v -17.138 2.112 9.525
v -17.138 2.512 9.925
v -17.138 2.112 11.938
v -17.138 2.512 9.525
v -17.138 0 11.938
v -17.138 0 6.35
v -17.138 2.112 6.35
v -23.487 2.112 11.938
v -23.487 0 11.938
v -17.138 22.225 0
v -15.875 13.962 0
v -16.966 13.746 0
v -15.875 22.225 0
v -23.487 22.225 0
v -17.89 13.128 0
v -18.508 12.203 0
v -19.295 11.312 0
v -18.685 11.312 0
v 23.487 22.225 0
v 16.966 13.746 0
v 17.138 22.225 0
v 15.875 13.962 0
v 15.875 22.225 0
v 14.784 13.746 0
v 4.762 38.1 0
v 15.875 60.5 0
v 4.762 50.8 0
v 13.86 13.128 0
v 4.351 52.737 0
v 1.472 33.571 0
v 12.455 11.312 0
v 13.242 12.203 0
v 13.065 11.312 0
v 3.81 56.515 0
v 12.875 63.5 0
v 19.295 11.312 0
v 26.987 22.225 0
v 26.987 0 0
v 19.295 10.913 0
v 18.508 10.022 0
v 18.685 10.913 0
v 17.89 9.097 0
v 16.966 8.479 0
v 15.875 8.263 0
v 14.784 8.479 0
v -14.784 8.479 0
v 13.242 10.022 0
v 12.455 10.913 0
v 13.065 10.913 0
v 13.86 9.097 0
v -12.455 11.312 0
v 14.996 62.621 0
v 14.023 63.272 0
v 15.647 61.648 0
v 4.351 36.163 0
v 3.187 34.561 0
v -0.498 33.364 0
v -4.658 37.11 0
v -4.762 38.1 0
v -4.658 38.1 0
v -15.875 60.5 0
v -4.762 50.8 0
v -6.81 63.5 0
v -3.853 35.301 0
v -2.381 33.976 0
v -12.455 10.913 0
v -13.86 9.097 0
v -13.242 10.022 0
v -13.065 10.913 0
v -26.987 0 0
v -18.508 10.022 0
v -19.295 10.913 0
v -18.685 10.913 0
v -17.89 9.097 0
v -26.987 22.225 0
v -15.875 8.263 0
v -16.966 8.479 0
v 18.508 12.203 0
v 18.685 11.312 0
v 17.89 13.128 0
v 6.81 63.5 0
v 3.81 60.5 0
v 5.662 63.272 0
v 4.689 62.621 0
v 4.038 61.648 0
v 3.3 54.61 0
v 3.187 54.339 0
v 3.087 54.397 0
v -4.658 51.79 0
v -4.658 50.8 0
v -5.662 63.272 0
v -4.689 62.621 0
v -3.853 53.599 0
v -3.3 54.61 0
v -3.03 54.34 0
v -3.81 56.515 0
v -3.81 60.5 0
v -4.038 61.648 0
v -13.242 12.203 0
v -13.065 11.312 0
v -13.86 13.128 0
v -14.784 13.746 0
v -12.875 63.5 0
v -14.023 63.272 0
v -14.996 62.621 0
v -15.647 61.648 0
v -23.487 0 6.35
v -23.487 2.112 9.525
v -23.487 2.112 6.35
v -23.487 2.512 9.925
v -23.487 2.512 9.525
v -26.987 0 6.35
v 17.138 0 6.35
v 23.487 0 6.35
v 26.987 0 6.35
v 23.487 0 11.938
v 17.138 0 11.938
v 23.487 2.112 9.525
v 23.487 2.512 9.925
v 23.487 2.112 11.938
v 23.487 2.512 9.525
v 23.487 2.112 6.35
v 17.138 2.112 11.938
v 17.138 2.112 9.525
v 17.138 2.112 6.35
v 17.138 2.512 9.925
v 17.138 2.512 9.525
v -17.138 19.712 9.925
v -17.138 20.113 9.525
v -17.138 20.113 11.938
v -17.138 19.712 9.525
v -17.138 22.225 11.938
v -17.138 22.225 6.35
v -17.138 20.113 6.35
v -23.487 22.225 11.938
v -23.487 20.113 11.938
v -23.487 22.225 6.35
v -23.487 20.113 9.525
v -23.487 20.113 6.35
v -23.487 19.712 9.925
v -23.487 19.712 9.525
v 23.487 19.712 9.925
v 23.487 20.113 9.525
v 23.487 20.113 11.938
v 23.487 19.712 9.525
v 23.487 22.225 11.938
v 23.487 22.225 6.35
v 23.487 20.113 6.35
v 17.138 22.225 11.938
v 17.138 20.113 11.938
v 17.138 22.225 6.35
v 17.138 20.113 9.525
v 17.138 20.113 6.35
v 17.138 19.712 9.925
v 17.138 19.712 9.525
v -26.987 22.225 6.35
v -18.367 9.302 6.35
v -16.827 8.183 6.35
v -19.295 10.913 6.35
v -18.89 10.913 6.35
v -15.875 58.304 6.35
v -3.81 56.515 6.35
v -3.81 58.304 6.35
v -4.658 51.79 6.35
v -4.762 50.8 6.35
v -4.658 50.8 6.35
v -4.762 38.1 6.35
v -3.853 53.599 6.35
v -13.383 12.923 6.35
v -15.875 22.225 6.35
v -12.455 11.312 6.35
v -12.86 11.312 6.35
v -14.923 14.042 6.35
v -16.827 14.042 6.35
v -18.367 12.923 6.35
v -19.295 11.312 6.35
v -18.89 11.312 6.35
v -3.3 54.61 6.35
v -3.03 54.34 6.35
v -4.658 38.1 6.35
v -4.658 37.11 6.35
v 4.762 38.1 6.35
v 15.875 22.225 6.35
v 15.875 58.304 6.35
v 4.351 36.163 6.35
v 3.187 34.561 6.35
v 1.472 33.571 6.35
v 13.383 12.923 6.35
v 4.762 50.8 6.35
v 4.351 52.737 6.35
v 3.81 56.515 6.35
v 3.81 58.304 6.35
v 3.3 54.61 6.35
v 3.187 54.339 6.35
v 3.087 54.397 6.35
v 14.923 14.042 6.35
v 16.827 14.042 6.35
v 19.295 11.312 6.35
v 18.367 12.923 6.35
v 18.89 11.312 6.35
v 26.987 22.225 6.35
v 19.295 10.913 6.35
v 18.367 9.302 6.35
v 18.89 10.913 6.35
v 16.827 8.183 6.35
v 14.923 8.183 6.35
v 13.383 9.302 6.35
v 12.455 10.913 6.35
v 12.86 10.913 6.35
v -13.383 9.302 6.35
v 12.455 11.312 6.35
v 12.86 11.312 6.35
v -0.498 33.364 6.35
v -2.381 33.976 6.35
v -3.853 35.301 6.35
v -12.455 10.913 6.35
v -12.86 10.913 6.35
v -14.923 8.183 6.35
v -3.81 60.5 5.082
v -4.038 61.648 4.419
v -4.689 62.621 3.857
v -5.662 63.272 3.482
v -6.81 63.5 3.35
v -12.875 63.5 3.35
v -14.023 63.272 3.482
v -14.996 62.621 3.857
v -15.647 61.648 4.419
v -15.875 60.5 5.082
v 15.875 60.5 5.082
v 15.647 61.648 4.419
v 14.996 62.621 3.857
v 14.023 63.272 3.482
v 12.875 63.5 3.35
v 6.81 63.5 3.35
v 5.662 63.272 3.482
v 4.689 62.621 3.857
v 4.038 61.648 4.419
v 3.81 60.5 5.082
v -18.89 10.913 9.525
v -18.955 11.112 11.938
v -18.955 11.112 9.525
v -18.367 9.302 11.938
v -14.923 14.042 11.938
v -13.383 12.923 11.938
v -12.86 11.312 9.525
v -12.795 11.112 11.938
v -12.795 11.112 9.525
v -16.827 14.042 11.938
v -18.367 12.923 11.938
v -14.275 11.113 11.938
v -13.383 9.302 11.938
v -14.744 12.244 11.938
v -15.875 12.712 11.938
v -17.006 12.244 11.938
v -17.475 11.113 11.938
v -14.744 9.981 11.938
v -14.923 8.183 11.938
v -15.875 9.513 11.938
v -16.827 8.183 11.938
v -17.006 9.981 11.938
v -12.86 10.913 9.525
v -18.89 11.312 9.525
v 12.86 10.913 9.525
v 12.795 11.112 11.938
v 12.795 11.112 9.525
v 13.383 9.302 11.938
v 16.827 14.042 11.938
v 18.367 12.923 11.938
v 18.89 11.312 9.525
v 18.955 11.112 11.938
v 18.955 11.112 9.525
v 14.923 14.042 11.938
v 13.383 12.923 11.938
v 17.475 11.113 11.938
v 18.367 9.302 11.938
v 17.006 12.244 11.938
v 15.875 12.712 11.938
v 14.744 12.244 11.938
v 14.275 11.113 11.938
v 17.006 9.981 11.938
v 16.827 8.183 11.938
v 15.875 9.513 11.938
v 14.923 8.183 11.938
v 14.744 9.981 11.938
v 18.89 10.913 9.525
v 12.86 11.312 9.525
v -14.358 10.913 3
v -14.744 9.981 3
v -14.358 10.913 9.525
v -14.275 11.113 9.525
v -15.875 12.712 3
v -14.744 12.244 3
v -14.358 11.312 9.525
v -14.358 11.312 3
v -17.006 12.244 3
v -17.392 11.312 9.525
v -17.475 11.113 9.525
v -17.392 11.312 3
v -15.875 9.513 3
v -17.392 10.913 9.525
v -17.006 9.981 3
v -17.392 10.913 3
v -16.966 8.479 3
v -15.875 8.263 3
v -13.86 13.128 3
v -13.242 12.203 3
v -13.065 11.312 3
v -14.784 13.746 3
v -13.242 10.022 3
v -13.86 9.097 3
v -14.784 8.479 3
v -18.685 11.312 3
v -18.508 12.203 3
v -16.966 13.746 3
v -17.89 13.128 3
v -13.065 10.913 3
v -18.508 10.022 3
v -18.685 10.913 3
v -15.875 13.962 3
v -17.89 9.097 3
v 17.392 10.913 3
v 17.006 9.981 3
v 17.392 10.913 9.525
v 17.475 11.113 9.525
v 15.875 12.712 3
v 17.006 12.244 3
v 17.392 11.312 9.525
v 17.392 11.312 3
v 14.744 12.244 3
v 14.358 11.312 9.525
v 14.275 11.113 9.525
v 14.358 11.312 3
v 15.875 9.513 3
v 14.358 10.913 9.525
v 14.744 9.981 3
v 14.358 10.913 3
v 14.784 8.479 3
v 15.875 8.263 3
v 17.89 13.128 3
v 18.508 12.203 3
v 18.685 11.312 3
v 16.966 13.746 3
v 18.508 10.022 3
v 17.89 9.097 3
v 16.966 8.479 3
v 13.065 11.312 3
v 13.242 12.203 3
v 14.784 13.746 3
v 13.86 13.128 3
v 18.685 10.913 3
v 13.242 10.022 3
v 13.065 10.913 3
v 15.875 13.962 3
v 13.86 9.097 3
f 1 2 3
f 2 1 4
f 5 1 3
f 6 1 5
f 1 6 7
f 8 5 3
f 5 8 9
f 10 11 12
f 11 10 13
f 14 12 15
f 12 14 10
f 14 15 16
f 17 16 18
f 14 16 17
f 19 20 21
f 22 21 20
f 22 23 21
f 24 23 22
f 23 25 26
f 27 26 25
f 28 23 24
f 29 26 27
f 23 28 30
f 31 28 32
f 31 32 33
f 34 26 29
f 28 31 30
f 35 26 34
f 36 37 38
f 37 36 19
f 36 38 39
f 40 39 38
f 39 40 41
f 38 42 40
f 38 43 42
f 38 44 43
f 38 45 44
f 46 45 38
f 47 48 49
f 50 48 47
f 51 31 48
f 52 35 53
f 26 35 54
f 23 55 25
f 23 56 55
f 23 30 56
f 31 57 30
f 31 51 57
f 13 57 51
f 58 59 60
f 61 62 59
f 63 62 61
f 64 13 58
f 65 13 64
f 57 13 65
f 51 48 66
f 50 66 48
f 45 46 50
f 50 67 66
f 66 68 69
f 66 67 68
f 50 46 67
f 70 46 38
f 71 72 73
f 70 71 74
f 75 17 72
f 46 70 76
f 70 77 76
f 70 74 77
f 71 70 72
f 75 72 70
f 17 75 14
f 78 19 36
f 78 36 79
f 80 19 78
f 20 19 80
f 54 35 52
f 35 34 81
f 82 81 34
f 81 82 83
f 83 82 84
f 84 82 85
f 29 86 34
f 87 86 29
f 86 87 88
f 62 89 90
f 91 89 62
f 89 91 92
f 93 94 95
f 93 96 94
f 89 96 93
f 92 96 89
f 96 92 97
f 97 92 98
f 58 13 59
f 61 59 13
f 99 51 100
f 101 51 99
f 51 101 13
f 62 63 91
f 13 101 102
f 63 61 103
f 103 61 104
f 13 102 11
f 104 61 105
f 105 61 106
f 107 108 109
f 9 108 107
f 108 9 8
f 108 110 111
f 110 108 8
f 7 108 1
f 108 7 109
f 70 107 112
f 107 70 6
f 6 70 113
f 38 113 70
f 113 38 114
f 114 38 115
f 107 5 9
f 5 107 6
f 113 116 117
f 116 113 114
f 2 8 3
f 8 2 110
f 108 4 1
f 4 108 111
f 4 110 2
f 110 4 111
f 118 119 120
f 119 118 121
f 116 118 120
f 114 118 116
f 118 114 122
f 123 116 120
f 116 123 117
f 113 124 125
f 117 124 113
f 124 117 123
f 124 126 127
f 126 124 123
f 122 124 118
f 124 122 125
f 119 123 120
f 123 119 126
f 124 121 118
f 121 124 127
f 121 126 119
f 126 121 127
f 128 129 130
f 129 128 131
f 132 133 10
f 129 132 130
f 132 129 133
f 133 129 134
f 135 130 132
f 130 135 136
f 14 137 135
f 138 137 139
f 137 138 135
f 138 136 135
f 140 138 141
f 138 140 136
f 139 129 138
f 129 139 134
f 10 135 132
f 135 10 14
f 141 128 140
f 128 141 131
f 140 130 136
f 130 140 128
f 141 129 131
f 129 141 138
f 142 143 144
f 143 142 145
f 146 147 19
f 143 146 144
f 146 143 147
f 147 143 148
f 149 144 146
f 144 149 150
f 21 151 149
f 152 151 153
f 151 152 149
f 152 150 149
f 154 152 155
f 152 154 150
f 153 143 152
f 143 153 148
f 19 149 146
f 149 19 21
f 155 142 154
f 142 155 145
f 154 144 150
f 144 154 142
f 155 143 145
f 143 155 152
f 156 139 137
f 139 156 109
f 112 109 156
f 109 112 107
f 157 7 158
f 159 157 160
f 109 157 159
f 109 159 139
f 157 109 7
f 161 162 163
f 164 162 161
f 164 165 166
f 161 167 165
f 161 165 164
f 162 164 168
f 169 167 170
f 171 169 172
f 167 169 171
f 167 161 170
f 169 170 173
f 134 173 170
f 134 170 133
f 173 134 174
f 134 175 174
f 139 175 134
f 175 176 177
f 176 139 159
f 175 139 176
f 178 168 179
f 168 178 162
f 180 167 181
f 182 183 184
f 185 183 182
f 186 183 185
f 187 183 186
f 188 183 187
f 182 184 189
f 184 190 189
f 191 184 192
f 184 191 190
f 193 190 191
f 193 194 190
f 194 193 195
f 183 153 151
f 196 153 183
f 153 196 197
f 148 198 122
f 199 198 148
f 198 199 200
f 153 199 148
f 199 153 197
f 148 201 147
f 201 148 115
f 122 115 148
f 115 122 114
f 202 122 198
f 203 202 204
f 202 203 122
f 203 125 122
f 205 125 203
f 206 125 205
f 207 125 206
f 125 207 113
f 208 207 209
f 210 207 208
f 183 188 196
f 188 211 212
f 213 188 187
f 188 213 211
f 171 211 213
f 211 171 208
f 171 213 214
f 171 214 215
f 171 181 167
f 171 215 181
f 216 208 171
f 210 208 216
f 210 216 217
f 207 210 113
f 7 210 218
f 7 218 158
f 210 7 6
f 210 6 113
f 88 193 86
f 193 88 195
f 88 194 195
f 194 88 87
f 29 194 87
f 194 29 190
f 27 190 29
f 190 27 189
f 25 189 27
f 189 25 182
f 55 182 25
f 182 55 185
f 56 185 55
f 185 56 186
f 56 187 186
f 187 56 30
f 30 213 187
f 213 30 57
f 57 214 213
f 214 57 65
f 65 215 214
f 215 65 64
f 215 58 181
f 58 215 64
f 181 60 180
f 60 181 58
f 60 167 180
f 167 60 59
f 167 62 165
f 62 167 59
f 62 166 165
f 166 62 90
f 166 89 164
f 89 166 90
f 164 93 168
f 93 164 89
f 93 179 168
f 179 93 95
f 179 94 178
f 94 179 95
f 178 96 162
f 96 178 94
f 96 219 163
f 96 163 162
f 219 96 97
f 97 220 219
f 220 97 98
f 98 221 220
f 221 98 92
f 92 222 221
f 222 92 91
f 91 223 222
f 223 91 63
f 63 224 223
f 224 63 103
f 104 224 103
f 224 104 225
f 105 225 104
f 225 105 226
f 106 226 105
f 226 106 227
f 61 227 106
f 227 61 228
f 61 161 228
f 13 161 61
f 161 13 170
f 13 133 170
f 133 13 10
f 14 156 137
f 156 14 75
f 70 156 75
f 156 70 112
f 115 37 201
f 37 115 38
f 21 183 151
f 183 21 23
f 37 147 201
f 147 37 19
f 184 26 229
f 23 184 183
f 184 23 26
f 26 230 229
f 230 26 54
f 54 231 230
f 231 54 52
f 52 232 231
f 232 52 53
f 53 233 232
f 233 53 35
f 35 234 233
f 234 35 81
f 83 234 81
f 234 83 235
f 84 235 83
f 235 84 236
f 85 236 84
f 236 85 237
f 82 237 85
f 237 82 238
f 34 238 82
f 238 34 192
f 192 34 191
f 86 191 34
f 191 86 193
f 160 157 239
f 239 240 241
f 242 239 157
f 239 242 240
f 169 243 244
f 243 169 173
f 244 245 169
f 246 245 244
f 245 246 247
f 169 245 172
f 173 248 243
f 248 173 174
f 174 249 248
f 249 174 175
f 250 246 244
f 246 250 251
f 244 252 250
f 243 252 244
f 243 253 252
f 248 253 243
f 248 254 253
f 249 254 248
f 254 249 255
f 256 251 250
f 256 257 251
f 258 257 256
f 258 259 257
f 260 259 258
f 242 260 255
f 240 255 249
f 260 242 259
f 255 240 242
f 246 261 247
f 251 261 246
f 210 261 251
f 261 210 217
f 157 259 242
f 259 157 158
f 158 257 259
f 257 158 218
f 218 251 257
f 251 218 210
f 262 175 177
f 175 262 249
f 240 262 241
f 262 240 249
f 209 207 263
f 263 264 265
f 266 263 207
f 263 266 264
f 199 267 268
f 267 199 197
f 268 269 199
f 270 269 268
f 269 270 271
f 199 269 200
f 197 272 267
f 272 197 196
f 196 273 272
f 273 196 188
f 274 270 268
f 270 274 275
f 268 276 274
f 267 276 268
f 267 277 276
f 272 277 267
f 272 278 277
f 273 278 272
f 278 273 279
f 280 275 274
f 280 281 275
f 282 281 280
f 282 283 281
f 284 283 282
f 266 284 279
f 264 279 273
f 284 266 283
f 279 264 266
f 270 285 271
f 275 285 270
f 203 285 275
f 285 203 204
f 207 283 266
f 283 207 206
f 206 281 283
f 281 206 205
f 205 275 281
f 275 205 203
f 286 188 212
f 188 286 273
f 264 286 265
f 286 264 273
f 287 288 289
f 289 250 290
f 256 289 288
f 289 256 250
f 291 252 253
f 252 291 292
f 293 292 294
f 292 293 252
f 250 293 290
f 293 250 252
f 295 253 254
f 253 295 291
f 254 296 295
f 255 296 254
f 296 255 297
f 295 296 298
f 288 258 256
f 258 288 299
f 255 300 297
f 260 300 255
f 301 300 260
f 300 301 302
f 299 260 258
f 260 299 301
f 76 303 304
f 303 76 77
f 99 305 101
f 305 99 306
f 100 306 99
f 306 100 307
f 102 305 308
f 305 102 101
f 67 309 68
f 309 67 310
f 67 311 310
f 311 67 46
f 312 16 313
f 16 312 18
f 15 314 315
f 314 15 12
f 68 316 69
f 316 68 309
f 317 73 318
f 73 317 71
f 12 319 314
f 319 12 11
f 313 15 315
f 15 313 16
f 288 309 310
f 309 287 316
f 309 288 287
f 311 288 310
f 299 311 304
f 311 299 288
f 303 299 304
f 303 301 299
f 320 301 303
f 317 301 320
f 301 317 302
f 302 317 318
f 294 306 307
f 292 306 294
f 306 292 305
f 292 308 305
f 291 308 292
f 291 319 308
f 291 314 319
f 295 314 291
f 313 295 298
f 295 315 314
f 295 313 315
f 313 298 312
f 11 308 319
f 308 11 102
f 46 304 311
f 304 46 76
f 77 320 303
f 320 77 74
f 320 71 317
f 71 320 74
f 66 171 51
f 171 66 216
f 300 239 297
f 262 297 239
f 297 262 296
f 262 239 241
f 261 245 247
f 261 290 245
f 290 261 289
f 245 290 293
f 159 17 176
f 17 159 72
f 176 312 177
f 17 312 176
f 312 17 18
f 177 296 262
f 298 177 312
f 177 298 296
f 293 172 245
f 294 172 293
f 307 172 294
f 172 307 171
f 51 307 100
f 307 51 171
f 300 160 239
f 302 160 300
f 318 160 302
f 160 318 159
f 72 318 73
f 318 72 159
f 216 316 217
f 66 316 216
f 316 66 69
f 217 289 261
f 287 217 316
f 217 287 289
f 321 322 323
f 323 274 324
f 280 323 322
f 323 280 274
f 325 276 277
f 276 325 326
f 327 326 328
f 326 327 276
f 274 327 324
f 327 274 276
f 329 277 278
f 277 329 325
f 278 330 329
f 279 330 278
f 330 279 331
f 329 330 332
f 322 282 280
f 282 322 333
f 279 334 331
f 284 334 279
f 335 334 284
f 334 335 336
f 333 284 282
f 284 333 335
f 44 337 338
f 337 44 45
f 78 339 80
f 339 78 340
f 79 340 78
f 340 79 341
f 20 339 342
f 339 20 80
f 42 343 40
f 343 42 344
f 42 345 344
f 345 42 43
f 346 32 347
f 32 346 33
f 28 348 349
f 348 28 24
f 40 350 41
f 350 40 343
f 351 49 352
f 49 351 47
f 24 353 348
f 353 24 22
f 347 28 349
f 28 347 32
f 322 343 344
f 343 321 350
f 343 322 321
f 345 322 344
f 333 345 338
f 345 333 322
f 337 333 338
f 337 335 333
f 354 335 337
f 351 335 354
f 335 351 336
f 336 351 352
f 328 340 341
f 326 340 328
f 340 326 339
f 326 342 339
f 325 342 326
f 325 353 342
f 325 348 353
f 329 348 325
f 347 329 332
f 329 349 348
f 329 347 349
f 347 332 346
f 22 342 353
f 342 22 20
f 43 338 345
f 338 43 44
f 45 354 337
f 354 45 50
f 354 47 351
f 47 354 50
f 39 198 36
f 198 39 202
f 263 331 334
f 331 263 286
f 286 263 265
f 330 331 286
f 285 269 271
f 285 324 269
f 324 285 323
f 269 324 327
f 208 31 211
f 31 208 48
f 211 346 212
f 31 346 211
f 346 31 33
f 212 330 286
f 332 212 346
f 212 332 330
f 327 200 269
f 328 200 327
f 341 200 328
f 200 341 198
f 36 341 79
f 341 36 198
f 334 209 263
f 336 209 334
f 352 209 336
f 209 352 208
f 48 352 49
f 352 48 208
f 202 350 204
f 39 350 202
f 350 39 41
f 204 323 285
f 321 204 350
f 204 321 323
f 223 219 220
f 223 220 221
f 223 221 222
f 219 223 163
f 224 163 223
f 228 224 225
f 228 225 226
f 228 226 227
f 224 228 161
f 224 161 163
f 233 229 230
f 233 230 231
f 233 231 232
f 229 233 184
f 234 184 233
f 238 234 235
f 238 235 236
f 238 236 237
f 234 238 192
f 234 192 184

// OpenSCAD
// Window clip.

render_part=0; // window_clip_outline
render_part=1; // window_clip

scale_1in=25.4;
bottom_width=(2+1/8)*scale_1in;
bottom_height=scale_1in*7/8;
bottom_th=scale_1in/4;
clip_width=(1+1/4)*scale_1in;
bottom2clip_height=2.5*scale_1in;
bottom2fork_height=(1+5/16)*scale_1in;
fork_tine_width=scale_1in*7/16;
hole_radius2radius=scale_1in*0.5;
fork_tine_tip_width=scale_1in*0.475;
fork_tine_tip_height=scale_1in*0.275;
clip_peg_outer_diameter=0.2425*scale_1in;
clip_peg_height=0.220*scale_1in;
clip_peg_inner_diameter=0.082*scale_1in;
bracket_inner_height=18.0;
bracket_inset_deltax=3.5;
bracket_clip_width=0.25*scale_1in;
bracket_clip_deltaz=0.125*scale_1in;
bracket_clip_overhang=0.4;

module window_clip_outline(bottom_w=bottom_width
	, bottom_h=bottom_height
	, clip_w=clip_width
	, bottom2clip_h=bottom2clip_height
	, bottom2fork_h=bottom2fork_height
	, fork_tine_w=fork_tine_width
	, hole_r2r=hole_radius2radius
	, fork_tine_tip_w=fork_tine_tip_width
	, fork_tine_tip_h=fork_tine_tip_height
	, bevel_r=3.0
	) {
  hole_d=clip_w-2*fork_tine_w;
  fork_tip_hole_w=clip_w-2*fork_tine_tip_w;
  translate([-bottom_w/2,0]) square(size=[bottom_w,bottom_h],center=false);
  difference() {
    union() {
	translate([-clip_w/2,0]) square(size=[clip_w,bottom2clip_h-fork_tine_tip_h],center=false);
	translate([0,bottom2clip_h-fork_tine_tip_h]) {
	  hull() {
		translate([-clip_w/2,-bevel_r]) {
			square([fork_tine_tip_w,bevel_r],center=false);
			translate([bevel_r,fork_tine_tip_h]) circle($fn=16,r=bevel_r);
			translate([fork_tine_tip_w-bevel_r,fork_tine_tip_h]) circle($fn=16,r=bevel_r);
		}
	  }
	  mirror([1,0]) hull() {
		translate([-clip_w/2,0]) {
			square([fork_tine_tip_w,bevel_r],center=false);
			translate([bevel_r,fork_tine_tip_h-bevel_r]) circle($fn=16,r=bevel_r);
			translate([fork_tine_tip_w-bevel_r,fork_tine_tip_h-bevel_r]) circle($fn=16,r=bevel_r);
		}
	  }
	}
    }
    translate([0,bottom2fork_h]) {
      translate([0,hole_d/2]) {
	  circle(r=hole_d/2);
	  translate([-hole_d/2,0]) square(size=[hole_d,hole_r2r],center=false);
	  translate([0,hole_r2r]) circle(r=hole_d/2);
      }
    }
    translate([0,bottom2clip_h]) {
	translate([-fork_tip_hole_w/2,-fork_tine_tip_h]) square(size=[fork_tip_hole_w,2*fork_tine_tip_h],center=false);
	translate([0,-fork_tine_tip_h]) circle(r=fork_tip_hole_w/2);
    }
  }
}

if(render_part==0) {
  echo("Render window clip outline...");
  linear_extrude(height=bottom_th) window_clip_outline();
}

module window_clip(bottom_w=bottom_width
	, bottom_h=bottom_height
	, clip_w=clip_width
	, bottom2clip_h=bottom2clip_height
	, bottom2fork_h=bottom2fork_height
	, fork_tine_w=fork_tine_width
	, hole_r2r=hole_radius2radius
	, fork_tine_tip_w=fork_tine_tip_width
	, fork_tine_tip_h=fork_tine_tip_height
	, bottom_th=bottom_th
	, peg_od=clip_peg_outer_diameter
	//, peg_id=clip_peg_inner_diameter
	, peg_id=3.2
	, peg_h=clip_peg_height
	, bracket_inner_h=bracket_inner_height
	, bracket_inset_dx=bracket_inset_deltax
	, bracket_clip_w=bracket_clip_width
	, bracket_clip_dz=bracket_clip_deltaz
	, bracket_clip_oh=bracket_clip_overhang
	, bevel_r=3.0
	, bolt_head_d=5.7
	, bolt_head_h=3.0
	) {
  bracket_clip_dy=(bottom_h-bracket_inner_h)/2;
  difference() {
    union() {
      linear_extrude(height=bottom_th) window_clip_outline(bottom_w=bottom_w
	,bottom_h=bottom_h
	,clip_w=clip_w
	,bottom2clip_h=bottom2clip_h
	,bottom2fork_h=bottom2fork_h
	,fork_tine_w=fork_tine_w
	,hole_r2r=hole_r2r
	,fork_tine_tip_w=fork_tine_tip_w
	,fork_tine_tip_h=fork_tine_tip_h
	, bevel_r=bevel_r
	);
      translate([-clip_w/2,bottom_h/2])
	  cylinder(r=peg_od/2,h=bottom_th+peg_h,center=false);
	translate([clip_w/2,bottom_h/2])
	  cylinder(r=peg_od/2,h=bottom_th+peg_h,center=false);
	translate([-bottom_w/2+bracket_inset_dx,0,0]) {
	  cube([bracket_clip_w,bracket_clip_dy,bottom_th+peg_h],center=false);
	  hull() {
	    translate([0,0,bottom_th+bracket_clip_dz]) cube([bracket_clip_w,bracket_clip_dy+bracket_clip_oh,bracket_clip_oh],center=false);
	    translate([0,0,bottom_th+peg_h-bracket_clip_oh]) cube([bracket_clip_w,bracket_clip_dy,bracket_clip_oh],center=false);
	  }
	}
	translate([bottom_w/2-bracket_inset_dx-bracket_clip_w,0,0]) {
	  cube([bracket_clip_w,bracket_clip_dy,bottom_th+peg_h],center=false);
	  hull() {
	    translate([0,0,bottom_th+bracket_clip_dz]) cube([bracket_clip_w,bracket_clip_dy+bracket_clip_oh,bracket_clip_oh],center=false);
	    translate([0,0,bottom_th+peg_h-bracket_clip_oh]) cube([bracket_clip_w,bracket_clip_dy,bracket_clip_oh],center=false);
	  }
	}
	translate([-bottom_w/2+bracket_inset_dx,bottom_h,0]) mirror([0,1,0]) {
	  cube([bracket_clip_w,bracket_clip_dy,bottom_th+peg_h],center=false);
	  hull() {
	    translate([0,0,bottom_th+bracket_clip_dz]) cube([bracket_clip_w,bracket_clip_dy+bracket_clip_oh,bracket_clip_oh],center=false);
	    translate([0,0,bottom_th+peg_h-bracket_clip_oh]) cube([bracket_clip_w,bracket_clip_dy,bracket_clip_oh],center=false);
	  }
	}
	translate([bottom_w/2-bracket_inset_dx-bracket_clip_w,bottom_h,0]) mirror([0,1,0]) {
	  cube([bracket_clip_w,bracket_clip_dy,bottom_th+peg_h],center=false);
	  hull() {
	    translate([0,0,bottom_th+bracket_clip_dz]) cube([bracket_clip_w,bracket_clip_dy+bracket_clip_oh,bracket_clip_oh],center=false);
	    translate([0,0,bottom_th+peg_h-bracket_clip_oh]) cube([bracket_clip_w,bracket_clip_dy,bracket_clip_oh],center=false);
	  }
	}
    }
    translate([-clip_w/2,bottom_h/2,0]) {
	cylinder($fn=8,r=peg_id/2,h=bottom_th+peg_h+0.2,center=false);
	cylinder($fn=16,r=bolt_head_d/2,h=2*bolt_head_h, center=true);
	cube([1.2*bolt_head_d,peg_id/8,2*(bottom_th+bracket_clip_dz)],center=true);
    }
    translate([clip_w/2,bottom_h/2,0]) {
	cylinder($fn=8,r=peg_id/2,h=bottom_th+peg_h+0.2,center=false);
	cylinder($fn=16,r=bolt_head_d/2,h=2*bolt_head_h, center=true);
	cube([1.2*bolt_head_d,peg_id/8,2*(bottom_th+bracket_clip_dz)],center=true);
    }	
    translate([-clip_w/2-bevel_r,bottom2clip_h,bottom_th-bevel_r]) rotate([60,0,0]) cube([clip_w+2*bevel_r,bevel_r,4*bevel_r],center=false);
  }	
}

if(render_part==1) {
  echo("Render window clip...");
  window_clip();
}
